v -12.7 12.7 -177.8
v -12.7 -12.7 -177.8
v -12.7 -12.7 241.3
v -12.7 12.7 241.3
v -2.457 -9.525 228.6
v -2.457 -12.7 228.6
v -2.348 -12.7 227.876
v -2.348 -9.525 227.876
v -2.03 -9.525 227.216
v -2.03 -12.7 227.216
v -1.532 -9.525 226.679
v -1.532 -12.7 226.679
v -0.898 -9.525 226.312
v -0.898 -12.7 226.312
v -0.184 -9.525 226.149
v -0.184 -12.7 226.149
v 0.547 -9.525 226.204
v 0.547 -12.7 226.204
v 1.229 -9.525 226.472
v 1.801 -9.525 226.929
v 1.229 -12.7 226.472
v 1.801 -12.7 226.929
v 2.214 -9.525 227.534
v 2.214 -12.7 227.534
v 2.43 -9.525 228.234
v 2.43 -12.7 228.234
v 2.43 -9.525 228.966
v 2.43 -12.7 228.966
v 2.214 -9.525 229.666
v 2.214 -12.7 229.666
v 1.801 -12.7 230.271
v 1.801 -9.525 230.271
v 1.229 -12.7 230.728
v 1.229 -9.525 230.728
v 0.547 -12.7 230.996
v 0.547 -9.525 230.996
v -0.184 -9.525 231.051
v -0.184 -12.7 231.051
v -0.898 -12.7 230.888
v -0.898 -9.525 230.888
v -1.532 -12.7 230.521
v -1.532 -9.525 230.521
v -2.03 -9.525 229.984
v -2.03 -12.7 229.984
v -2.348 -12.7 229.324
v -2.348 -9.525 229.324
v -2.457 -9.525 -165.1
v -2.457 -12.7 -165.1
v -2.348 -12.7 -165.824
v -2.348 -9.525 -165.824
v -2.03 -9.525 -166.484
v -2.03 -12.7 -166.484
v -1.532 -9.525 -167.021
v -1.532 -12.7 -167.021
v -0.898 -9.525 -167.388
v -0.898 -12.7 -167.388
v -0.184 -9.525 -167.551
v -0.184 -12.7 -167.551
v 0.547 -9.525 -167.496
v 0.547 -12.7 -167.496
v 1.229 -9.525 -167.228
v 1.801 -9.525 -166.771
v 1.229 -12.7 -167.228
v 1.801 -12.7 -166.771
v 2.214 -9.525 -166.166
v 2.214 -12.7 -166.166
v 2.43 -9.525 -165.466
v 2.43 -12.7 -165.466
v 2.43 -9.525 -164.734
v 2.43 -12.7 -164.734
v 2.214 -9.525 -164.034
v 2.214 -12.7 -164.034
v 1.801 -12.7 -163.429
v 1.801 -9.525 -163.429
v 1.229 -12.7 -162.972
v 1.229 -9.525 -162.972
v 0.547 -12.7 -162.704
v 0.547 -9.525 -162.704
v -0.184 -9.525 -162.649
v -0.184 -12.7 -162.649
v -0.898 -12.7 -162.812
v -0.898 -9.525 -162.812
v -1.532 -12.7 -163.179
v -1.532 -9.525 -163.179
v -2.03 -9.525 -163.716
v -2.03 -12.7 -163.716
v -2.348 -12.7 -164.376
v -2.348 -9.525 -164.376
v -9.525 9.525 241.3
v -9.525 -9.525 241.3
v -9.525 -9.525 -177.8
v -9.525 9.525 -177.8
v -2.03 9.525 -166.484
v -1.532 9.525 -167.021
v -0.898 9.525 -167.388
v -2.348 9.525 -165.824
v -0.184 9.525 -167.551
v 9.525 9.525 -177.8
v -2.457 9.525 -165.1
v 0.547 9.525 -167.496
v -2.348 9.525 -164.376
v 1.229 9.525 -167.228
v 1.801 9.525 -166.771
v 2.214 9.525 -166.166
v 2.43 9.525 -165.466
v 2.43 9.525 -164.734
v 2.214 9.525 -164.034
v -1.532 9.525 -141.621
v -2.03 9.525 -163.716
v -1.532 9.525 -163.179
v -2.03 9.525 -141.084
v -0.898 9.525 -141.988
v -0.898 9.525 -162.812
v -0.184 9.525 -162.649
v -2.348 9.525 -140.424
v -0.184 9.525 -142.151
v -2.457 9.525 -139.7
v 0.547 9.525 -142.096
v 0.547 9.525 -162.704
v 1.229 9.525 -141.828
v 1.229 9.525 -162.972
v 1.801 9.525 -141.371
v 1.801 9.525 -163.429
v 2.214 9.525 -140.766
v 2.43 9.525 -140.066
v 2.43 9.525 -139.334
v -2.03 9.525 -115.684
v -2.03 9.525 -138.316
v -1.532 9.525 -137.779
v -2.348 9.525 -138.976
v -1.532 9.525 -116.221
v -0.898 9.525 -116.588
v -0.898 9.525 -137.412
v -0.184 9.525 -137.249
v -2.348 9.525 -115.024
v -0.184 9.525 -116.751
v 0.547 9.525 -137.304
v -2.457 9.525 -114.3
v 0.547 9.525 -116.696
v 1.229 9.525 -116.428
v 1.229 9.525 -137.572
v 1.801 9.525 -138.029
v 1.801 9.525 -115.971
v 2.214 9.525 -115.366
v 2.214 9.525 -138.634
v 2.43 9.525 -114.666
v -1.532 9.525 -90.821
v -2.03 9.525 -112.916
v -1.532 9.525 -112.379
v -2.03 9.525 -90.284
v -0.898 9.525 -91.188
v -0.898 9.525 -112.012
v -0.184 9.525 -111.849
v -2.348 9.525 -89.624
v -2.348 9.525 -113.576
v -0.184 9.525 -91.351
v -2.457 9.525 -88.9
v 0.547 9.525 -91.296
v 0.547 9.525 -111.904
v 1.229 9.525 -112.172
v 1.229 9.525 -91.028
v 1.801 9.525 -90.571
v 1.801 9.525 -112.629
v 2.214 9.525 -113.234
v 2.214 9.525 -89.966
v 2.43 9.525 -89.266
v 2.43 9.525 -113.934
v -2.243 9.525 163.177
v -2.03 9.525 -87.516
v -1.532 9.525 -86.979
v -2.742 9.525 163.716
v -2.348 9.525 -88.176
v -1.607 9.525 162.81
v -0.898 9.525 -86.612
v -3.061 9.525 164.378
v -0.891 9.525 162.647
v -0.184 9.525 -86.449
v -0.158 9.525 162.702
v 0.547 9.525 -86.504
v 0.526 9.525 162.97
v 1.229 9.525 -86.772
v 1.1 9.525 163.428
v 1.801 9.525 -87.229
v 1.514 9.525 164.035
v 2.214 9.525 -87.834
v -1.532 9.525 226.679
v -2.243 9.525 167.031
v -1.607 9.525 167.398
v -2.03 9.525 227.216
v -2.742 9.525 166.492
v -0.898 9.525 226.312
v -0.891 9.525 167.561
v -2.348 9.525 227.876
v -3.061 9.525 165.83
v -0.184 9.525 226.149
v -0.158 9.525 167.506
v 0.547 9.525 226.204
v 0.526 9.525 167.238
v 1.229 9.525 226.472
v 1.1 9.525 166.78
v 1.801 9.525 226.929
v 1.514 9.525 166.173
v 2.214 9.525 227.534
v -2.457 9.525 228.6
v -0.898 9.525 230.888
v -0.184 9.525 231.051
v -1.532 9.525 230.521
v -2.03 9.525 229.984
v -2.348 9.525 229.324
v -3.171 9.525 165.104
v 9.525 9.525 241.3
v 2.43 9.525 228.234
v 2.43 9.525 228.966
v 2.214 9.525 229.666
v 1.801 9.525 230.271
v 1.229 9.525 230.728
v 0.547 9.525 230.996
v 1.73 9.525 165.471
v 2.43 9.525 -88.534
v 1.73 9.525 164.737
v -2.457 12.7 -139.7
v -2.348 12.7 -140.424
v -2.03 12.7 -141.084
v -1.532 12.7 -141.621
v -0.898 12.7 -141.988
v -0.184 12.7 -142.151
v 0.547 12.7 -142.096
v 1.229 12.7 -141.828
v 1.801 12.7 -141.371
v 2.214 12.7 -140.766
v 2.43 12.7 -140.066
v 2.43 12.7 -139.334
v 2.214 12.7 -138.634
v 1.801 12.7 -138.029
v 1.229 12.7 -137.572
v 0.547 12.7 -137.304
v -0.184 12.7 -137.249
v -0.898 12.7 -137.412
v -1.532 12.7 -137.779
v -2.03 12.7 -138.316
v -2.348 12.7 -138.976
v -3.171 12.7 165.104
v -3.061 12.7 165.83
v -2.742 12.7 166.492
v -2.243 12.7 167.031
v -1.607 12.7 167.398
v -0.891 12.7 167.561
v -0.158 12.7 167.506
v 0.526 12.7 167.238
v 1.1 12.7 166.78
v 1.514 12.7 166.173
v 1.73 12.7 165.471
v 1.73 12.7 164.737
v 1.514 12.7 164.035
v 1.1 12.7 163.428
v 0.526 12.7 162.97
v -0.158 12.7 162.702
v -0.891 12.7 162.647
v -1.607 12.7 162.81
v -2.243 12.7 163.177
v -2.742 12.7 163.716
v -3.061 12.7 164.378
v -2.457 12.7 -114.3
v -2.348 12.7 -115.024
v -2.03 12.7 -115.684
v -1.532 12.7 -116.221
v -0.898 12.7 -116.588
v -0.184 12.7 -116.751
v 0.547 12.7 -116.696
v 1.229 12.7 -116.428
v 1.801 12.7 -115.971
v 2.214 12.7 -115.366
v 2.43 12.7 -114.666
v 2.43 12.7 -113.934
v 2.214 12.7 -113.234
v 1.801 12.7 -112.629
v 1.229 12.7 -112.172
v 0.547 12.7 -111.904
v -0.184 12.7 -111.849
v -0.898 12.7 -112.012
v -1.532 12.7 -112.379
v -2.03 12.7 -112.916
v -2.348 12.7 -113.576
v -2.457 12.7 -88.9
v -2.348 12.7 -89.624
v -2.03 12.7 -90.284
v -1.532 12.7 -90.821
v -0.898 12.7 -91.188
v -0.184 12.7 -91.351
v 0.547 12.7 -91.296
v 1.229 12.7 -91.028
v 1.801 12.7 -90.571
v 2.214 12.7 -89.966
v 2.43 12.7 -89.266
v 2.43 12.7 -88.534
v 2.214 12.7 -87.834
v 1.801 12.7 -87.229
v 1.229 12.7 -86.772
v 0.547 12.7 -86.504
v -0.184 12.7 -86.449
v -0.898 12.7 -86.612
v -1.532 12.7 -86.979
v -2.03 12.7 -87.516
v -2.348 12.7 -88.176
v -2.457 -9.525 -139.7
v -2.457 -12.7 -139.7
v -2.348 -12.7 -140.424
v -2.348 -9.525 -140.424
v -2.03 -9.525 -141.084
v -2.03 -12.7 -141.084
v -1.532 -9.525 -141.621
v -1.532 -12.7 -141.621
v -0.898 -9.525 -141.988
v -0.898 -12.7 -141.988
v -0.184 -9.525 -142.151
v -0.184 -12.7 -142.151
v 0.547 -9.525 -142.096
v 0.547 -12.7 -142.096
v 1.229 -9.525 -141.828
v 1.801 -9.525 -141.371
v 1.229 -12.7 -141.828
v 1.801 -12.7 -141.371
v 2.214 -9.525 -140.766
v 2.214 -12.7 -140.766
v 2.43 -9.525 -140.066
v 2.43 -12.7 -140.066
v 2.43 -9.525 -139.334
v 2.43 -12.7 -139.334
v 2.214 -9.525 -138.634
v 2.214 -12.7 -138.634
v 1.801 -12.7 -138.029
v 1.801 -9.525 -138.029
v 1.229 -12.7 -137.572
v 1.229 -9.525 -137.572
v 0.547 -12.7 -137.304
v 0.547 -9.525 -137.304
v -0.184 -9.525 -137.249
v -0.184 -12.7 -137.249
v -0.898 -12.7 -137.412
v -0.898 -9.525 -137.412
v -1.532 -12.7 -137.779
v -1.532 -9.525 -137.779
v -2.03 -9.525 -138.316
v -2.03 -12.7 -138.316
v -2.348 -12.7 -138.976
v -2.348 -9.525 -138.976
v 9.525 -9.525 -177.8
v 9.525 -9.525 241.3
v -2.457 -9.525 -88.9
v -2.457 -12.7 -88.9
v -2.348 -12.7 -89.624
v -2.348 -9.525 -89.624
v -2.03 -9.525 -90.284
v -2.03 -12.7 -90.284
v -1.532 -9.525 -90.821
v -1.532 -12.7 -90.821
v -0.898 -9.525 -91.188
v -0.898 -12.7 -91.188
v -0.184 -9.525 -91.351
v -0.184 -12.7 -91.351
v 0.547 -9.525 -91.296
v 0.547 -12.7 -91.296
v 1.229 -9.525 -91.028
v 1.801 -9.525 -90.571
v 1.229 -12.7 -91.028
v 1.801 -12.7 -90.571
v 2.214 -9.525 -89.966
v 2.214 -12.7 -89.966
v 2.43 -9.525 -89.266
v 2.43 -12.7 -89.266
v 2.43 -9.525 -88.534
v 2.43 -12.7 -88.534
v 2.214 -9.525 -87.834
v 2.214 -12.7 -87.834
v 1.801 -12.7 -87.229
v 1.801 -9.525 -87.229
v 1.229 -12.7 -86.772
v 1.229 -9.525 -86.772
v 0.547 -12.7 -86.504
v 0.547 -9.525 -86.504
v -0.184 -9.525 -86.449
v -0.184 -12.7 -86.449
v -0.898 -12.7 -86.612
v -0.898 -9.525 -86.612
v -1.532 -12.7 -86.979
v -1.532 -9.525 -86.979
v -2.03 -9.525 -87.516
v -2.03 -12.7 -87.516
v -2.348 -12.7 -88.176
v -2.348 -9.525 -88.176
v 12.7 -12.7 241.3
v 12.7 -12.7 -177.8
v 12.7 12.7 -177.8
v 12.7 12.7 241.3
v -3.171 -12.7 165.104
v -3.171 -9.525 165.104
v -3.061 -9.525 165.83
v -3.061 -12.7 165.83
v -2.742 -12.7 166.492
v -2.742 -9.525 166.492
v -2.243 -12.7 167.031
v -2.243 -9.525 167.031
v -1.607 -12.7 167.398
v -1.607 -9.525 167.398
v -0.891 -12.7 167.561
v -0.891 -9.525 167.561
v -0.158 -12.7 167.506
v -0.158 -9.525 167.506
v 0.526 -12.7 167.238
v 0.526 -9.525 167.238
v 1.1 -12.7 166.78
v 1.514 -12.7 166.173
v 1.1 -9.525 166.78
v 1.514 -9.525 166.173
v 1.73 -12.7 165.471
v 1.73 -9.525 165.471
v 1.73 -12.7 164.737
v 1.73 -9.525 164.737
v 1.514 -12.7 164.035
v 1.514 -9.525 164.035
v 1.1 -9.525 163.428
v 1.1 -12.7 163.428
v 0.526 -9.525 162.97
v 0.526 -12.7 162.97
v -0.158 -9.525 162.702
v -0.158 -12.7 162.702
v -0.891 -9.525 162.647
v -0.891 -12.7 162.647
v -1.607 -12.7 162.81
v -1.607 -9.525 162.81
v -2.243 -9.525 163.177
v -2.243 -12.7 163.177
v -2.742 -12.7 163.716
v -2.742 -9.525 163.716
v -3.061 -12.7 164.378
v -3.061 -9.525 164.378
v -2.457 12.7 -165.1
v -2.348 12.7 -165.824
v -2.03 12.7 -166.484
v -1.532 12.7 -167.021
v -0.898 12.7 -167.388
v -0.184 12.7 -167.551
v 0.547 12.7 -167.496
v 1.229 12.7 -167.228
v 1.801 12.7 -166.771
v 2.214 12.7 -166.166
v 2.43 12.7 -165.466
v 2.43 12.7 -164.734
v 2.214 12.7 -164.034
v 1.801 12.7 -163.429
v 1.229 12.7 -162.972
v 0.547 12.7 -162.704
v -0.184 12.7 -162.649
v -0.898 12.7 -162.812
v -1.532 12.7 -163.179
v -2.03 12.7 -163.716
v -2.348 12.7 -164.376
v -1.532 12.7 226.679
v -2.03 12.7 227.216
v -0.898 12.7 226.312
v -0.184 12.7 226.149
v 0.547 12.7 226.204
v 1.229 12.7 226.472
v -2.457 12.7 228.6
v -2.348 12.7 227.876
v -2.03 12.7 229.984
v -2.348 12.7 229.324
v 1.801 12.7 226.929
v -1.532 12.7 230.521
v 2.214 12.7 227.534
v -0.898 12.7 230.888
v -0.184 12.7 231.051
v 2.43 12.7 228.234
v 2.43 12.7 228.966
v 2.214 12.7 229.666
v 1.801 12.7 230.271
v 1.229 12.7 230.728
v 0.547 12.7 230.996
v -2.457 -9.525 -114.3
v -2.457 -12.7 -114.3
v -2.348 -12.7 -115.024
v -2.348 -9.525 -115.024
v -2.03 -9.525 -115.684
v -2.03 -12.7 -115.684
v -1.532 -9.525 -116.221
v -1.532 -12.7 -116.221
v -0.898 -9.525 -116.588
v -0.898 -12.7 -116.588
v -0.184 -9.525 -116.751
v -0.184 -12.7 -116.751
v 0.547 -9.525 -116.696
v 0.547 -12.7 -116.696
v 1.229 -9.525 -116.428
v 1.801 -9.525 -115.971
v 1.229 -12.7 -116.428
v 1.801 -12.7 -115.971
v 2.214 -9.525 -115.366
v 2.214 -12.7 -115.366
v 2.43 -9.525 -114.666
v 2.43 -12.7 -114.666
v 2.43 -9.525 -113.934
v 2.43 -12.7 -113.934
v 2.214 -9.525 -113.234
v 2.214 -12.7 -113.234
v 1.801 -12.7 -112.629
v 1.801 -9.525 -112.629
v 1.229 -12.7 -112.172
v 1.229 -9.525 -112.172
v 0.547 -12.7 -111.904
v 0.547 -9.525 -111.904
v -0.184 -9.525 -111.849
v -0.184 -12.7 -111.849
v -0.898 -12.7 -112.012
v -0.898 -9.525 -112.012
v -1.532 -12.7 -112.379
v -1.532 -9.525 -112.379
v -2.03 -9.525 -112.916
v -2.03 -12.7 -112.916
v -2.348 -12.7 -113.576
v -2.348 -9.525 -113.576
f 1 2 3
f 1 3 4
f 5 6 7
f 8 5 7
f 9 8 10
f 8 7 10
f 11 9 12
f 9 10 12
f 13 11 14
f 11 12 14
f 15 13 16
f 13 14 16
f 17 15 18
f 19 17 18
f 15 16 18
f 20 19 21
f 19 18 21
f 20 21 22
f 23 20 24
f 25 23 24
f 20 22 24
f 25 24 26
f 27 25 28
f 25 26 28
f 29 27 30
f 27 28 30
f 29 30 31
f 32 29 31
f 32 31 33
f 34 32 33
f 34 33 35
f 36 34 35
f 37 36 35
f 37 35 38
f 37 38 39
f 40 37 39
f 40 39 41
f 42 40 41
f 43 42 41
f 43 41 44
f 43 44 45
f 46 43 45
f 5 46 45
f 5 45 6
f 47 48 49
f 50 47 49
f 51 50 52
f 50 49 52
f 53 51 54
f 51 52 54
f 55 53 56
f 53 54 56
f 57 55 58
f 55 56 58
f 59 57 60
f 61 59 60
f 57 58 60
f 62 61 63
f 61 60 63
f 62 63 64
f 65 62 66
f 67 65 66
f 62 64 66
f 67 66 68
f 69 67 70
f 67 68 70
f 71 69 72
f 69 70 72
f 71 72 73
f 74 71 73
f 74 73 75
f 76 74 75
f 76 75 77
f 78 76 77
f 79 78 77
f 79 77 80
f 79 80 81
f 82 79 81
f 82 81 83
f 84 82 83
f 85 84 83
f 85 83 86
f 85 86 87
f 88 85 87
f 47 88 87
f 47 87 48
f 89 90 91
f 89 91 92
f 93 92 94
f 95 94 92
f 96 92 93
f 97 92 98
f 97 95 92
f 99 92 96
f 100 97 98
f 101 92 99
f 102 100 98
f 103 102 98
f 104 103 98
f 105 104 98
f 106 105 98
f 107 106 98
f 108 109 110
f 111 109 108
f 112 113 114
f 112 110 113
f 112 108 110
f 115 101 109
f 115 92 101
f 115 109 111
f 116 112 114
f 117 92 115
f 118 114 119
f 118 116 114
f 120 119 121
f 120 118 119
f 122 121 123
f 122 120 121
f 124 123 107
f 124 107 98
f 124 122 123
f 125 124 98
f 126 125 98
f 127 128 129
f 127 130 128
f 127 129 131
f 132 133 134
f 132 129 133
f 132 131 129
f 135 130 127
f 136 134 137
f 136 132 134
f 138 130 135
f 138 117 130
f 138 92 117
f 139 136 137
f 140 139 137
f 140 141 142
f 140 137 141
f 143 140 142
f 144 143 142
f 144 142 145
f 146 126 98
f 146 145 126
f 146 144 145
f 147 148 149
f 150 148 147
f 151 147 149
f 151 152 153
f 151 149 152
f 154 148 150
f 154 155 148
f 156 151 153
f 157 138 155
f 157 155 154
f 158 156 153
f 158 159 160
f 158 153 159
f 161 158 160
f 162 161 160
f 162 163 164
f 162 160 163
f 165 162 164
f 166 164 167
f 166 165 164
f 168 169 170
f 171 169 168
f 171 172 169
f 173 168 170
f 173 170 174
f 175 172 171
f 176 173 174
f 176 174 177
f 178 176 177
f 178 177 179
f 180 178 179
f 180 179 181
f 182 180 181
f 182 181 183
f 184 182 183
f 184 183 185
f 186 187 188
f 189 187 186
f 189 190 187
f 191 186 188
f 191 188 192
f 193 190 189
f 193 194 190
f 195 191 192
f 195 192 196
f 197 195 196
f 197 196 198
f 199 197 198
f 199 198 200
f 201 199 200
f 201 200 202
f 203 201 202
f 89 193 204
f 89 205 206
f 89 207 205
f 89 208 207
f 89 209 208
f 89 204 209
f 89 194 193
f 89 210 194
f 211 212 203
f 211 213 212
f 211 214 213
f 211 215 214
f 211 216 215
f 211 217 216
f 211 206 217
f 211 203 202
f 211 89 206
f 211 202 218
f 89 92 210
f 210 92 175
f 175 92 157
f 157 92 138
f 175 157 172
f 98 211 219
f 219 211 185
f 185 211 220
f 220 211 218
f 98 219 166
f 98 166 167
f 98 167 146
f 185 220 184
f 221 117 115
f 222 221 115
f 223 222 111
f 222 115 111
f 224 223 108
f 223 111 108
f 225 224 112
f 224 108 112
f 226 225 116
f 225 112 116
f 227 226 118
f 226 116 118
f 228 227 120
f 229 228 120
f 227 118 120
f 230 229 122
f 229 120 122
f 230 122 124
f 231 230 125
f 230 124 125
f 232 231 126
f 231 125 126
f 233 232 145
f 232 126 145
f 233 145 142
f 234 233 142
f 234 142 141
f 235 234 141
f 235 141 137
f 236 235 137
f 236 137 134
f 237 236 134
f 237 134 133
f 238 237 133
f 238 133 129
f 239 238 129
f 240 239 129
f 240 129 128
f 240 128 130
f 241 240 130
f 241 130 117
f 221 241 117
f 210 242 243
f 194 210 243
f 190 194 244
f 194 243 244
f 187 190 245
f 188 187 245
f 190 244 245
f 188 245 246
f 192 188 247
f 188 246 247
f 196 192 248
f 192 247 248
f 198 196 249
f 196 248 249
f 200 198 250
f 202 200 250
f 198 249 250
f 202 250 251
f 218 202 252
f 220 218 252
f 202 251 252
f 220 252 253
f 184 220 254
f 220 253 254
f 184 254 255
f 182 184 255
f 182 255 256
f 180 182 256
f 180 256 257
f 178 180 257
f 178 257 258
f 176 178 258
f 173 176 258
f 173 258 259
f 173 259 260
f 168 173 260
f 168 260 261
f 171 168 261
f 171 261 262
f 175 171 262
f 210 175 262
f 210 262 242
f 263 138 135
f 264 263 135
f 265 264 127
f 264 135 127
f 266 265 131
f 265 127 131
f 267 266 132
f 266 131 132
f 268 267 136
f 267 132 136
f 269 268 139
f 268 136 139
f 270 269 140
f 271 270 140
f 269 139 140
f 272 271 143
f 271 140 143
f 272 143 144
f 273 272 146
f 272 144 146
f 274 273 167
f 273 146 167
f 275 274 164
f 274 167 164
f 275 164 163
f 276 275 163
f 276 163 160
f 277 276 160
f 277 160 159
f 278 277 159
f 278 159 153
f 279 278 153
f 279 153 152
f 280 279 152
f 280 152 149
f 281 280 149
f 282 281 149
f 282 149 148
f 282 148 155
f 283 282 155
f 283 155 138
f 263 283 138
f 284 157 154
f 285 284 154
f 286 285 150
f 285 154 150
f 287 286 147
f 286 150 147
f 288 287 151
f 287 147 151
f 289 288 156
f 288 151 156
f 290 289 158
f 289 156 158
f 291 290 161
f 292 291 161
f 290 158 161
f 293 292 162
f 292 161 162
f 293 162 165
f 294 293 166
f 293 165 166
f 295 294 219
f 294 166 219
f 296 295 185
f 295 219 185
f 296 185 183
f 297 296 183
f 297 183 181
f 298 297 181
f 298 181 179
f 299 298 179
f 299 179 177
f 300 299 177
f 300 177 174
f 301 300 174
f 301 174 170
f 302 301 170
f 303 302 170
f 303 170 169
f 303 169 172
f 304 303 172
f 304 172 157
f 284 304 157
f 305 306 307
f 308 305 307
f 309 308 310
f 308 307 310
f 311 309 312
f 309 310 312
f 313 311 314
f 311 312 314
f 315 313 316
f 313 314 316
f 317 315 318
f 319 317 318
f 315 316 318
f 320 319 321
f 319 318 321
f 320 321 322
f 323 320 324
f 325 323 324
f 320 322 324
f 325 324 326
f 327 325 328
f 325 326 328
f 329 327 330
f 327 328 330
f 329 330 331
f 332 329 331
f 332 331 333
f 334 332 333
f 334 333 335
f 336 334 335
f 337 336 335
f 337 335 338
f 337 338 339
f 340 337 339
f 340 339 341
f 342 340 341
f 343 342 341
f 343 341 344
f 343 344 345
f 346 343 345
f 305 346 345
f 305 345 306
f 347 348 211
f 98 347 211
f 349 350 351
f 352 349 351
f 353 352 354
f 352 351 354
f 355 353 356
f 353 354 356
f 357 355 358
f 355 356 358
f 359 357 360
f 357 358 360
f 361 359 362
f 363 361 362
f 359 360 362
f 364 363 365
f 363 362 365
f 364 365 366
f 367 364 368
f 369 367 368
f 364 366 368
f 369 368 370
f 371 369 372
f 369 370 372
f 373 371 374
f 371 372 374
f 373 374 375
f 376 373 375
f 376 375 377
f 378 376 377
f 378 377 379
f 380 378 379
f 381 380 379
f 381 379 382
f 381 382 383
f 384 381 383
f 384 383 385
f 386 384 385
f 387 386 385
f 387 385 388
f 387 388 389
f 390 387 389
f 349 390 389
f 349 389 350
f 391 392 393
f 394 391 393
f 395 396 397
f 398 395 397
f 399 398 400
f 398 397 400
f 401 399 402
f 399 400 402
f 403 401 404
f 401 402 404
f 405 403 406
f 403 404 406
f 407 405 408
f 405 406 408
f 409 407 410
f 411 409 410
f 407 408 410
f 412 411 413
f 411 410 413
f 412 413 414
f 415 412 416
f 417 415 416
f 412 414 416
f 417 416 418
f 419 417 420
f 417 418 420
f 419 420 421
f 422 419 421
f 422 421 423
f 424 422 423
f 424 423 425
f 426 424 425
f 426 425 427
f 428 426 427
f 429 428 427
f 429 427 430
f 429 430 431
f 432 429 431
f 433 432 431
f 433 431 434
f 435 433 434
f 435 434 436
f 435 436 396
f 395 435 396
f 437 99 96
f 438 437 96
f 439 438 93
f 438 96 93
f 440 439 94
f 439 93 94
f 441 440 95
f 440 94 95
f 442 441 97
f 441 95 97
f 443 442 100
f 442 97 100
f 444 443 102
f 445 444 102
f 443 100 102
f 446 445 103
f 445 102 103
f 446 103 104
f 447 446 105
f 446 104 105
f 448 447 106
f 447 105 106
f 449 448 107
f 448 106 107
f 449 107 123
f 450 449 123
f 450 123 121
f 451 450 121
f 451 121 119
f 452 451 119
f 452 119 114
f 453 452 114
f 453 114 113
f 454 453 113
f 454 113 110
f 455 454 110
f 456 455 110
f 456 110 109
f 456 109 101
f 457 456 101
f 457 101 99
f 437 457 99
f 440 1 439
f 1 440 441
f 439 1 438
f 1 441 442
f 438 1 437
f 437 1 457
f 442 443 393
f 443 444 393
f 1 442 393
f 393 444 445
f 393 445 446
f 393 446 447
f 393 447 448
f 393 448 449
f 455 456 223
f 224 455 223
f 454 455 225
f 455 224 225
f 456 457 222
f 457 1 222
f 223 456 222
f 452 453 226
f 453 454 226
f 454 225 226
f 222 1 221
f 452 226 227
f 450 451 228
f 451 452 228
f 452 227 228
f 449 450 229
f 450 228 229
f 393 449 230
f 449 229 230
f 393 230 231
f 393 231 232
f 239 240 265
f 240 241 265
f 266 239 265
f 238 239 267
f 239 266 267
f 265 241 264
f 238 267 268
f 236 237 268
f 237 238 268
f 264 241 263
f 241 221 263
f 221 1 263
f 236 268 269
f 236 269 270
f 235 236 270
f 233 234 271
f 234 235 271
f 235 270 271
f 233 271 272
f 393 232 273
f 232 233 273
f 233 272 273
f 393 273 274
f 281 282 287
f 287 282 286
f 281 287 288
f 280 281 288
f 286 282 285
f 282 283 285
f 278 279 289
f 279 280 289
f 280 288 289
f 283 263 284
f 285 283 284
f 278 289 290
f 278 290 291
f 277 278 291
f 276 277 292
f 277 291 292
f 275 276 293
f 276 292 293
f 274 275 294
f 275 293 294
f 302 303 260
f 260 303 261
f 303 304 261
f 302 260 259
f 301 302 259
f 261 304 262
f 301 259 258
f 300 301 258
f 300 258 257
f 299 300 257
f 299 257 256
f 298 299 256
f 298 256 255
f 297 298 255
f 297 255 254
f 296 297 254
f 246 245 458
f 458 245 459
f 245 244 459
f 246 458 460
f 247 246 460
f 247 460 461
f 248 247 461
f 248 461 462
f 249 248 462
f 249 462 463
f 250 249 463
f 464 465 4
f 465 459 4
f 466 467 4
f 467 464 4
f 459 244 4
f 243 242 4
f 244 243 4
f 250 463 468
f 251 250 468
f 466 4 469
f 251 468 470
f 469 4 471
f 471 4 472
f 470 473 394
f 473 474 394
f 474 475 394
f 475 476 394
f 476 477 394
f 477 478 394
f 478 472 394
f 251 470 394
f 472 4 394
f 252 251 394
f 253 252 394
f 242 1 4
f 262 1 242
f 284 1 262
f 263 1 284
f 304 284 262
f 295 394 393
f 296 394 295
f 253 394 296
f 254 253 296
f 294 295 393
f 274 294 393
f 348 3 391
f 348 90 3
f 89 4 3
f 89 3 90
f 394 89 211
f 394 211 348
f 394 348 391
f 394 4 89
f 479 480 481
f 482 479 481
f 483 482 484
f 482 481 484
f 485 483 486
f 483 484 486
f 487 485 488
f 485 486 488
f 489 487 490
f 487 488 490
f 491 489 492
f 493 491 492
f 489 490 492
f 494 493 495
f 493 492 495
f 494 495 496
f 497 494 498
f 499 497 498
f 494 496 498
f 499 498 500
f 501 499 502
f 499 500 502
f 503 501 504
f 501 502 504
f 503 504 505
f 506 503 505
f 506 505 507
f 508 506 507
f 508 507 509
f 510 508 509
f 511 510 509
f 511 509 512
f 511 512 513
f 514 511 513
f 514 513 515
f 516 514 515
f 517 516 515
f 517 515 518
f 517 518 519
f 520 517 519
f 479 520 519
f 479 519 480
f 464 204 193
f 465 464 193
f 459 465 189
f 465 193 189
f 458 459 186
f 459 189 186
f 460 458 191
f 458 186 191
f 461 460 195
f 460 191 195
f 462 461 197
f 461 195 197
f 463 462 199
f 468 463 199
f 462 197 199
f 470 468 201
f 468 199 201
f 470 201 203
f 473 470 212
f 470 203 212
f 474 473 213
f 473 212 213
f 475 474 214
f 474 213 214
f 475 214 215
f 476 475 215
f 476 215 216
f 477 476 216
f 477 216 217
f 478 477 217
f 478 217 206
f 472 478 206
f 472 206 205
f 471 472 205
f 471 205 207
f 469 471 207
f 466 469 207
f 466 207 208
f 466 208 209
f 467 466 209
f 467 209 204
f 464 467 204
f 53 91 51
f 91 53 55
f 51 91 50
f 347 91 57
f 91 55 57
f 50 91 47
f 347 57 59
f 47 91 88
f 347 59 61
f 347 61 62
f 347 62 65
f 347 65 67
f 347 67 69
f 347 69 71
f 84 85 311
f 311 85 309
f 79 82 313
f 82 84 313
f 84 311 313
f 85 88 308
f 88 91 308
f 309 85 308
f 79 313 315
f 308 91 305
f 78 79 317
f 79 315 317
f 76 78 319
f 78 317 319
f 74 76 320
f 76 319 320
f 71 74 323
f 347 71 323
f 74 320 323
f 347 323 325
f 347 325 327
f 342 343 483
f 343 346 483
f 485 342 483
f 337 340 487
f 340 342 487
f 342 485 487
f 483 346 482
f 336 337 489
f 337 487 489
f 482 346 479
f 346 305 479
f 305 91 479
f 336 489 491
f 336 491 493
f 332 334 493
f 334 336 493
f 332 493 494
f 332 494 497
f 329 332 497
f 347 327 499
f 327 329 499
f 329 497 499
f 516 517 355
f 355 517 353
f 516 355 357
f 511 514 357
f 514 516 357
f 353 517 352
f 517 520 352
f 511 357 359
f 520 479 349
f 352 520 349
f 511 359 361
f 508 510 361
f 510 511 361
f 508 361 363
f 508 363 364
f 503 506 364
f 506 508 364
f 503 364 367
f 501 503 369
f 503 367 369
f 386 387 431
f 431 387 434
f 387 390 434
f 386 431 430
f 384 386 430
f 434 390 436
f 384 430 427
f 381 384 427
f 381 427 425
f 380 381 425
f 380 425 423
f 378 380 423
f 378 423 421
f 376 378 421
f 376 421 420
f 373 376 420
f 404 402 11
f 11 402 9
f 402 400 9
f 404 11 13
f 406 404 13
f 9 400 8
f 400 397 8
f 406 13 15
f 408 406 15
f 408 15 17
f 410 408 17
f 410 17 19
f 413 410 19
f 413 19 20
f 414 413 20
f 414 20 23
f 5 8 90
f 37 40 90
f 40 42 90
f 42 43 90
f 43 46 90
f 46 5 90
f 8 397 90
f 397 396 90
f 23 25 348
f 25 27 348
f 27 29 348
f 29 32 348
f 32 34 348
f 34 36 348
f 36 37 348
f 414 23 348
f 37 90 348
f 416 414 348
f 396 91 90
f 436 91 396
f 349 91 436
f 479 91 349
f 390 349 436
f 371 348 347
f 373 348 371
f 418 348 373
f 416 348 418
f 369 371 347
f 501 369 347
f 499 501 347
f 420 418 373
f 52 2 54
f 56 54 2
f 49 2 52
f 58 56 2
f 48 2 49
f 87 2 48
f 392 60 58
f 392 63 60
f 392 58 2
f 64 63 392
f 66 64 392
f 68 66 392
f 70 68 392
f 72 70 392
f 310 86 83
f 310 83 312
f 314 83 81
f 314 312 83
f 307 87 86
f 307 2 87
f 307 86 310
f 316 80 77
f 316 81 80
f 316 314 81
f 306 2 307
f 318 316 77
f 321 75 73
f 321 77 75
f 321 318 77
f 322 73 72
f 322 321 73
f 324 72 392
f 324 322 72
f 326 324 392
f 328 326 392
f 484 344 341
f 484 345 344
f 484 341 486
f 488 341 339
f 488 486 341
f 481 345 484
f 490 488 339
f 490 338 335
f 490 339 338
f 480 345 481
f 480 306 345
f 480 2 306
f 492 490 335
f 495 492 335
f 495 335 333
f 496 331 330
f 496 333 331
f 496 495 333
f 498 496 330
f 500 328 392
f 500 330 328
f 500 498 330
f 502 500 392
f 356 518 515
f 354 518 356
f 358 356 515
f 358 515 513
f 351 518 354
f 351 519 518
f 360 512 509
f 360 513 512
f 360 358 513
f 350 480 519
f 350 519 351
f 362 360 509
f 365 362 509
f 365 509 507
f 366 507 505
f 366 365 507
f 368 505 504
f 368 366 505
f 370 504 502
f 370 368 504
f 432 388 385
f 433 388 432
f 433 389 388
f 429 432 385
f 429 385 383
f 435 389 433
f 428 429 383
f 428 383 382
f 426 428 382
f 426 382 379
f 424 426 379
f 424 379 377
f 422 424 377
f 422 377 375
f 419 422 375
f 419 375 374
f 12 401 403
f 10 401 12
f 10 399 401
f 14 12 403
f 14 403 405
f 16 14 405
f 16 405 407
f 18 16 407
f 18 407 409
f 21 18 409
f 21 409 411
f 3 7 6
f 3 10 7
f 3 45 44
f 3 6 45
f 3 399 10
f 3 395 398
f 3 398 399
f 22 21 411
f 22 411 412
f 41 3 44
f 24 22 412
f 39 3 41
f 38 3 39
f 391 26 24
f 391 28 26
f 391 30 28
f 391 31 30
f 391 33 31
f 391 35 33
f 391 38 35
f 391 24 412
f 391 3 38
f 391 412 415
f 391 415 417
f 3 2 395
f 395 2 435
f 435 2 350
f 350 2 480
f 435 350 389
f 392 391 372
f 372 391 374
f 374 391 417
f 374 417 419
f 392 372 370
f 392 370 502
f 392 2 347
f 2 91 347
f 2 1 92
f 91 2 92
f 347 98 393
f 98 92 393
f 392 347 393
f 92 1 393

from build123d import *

# Parameters (mm, degrees)
SKETCH1_W                        = 25.4
SKETCH1_H                        = 25.4
SKETCH1_W_2                      = 19.05
SKETCH1_H_2                      = 19.05
BOSS_EXTRUDE1_DEPTH              = 241.3
F_10_0_1935_DIAMETER_HOLE1_D     = 4.9149
F_10_0_1935_DIAMETER_HOLE1_DEPTH = 50.8
F_10_0_1935_DIAMETER_HOLE1_TIP   = 1.476584928
SKETCH5_R                        = 2.464210786
CUT_EXTRUDE1_DEPTH               = 243.965306165
SKETCH6_W                        = 25.4
SKETCH6_H                        = 63.5
CUT_EXTRUDE2_DEPTH               = 243.965306165


with BuildPart() as part:
    # Sketch1 → Boss-Extrude1 (new, symmetric)
    with BuildSketch(Plane.XY):
        Rectangle(SKETCH1_W, SKETCH1_H)
        Rectangle(SKETCH1_W_2, SKETCH1_H_2, mode=Mode.SUBTRACT)
    extrude(amount=BOSS_EXTRUDE1_DEPTH, both=True)

    # #10 (0.1935) Diameter Hole1
    with Locations(Plane(origin=(0, 12.7, 0), x_dir=(1, 0, 0), z_dir=(0, 1, 0))):
        with Locations((0, -228.6), (0, 88.9), (0, 114.3), (0, 139.7), (0, 165.1), (0, 190.5), (0, 215.9)):
            Hole(F_10_0_1935_DIAMETER_HOLE1_D / 2, depth=F_10_0_1935_DIAMETER_HOLE1_DEPTH)
            with Locations((0, 0, -(F_10_0_1935_DIAMETER_HOLE1_DEPTH + F_10_0_1935_DIAMETER_HOLE1_TIP / 2))):  # 118° drill point
                Cone(0, F_10_0_1935_DIAMETER_HOLE1_D / 2, F_10_0_1935_DIAMETER_HOLE1_TIP, mode=Mode.SUBTRACT)

    # Sketch5 → Cut-Extrude1 (cut, through all)
    with BuildSketch(Plane(origin=(0, 12.7, 0), x_dir=(1, 0, 0), z_dir=(0, 1, 0))):
        with Locations(Location((-0.70643934, -165.103929701, 0), (0, 0, 180))):
            Circle(SKETCH5_R)
    extrude(amount=-CUT_EXTRUDE1_DEPTH, mode=Mode.SUBTRACT)

    # Sketch6 → Cut-Extrude2 (cut, through all)
    with BuildSketch(Plane(origin=(0, 12.7, 0), x_dir=(1, 0, 0), z_dir=(0, 1, 0))):
        with Locations((0, 209.55)):
            Rectangle(SKETCH6_W, SKETCH6_H)
    extrude(amount=-CUT_EXTRUDE2_DEPTH, mode=Mode.SUBTRACT)


solid = part.part
